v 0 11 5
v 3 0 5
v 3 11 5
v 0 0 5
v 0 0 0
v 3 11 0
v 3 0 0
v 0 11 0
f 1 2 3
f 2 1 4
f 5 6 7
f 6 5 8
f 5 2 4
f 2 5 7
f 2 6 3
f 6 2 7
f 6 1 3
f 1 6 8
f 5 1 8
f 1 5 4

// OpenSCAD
// Generated by SolidPython 1.0.1 on 2020-07-29 00:46:54


cube(size = [3, 11, 5]);
/***********************************************
*********      SolidPython code:      **********
************************************************
 
# import packages: SolidPython
from solid import *
from solid.utils import *
from itertools import chain, combinations, permutations


class Resize:

    def __init__(self, scad_file):
        self.scad_file = scad_file
        #self.scad_file = import_scad(scad_file)
        # cone/cylinder param:
        self.r1 = 0
        self.r2 = 0
        self.h = 0
        # rectangular prism param:
        self.w = 0
        self.l = 0
        # ellipse param:
        self.r = 0

    # import OpenScad code (file name corresponds to shape)


    # classify shape + parameters
    def assign(self, param1, param2, param3):
        if self.scad_file == 'cone.scad':
            self.r1 = param1
            self.r2 = param2
            self.h = param3
        elif self.scad_file == 'cylinder.scad':
            self.r1 = param1
            self.r2 = param2
            self.h = param3
        elif self.scad_file == 'rectangularPrism.scad':
            self.h = param1
            self.l = param2
            self.w = param3
        else:
            self.r = param1
            self.h = param2

    # resize parameters
    def iterate(self):
        x = range(3, 20, 2)
        i = 1
        if self.scad_file == 'cone.scad':
            tempList = list(permutations(x, 2))
            for temp in tempList:
                param1 = temp[0]
                param2 = temp[1]
                filepath = 'produced_scad_files/' + 'cone' + str(param1) + '_' + str(param2) + '_' + '.scad'
                scad_render_to_file(cylinder(h=param1, r1=param2, r2=0), filepath)

        elif self.scad_file == 'cylinder.scad':
            tempList = list(permutations(x, 3))
            for temp in tempList:
                param1 = temp[0]
                param2 = temp[1]
                filepath = 'produced_scad_files/' + 'cylinder' + str(param1) + '_' + str(param2) + '_' + '.scad'
                scad_render_to_file(cylinder(h=param1, r1=param2, r2=param2), filepath)

        elif self.scad_file == 'rectangularPrism.scad':
            tempList = list(permutations(x, 3))
            for temp in tempList:
                param1 = temp[0]
                param2 = temp[1]
                param3 = temp[2]
                filepath = 'produced_scad_files/' + 'rectangularPrism' + str(param1) + '_' + str(param2) + '_' + str(
                    param3) + '.scad'
                scad_render_to_file(cube(size=(param1, param2, param3)), filepath)

        elif self.scad_file == 'ellipse.scad':
            tempList = list(permutations(x, 4))
            for temp in tempList:
                param1 = temp[0]
                param2 = temp[1]
                param3 = temp[2]
                param4 = temp[3]
                filepath = 'produced_scad_files/' + 'ellipse' + str(param1) + '_' + str(param2) + '_' + str(param3) + '_' + str(param4) + '.scad'
                scad_render_to_file(scale([param1, param2, param3])(sphere(r=param4)), filepath)

    def render_to_scadfile(self):
        scad_render_to_file(scad, 'example.scad') 
 
************************************************/
